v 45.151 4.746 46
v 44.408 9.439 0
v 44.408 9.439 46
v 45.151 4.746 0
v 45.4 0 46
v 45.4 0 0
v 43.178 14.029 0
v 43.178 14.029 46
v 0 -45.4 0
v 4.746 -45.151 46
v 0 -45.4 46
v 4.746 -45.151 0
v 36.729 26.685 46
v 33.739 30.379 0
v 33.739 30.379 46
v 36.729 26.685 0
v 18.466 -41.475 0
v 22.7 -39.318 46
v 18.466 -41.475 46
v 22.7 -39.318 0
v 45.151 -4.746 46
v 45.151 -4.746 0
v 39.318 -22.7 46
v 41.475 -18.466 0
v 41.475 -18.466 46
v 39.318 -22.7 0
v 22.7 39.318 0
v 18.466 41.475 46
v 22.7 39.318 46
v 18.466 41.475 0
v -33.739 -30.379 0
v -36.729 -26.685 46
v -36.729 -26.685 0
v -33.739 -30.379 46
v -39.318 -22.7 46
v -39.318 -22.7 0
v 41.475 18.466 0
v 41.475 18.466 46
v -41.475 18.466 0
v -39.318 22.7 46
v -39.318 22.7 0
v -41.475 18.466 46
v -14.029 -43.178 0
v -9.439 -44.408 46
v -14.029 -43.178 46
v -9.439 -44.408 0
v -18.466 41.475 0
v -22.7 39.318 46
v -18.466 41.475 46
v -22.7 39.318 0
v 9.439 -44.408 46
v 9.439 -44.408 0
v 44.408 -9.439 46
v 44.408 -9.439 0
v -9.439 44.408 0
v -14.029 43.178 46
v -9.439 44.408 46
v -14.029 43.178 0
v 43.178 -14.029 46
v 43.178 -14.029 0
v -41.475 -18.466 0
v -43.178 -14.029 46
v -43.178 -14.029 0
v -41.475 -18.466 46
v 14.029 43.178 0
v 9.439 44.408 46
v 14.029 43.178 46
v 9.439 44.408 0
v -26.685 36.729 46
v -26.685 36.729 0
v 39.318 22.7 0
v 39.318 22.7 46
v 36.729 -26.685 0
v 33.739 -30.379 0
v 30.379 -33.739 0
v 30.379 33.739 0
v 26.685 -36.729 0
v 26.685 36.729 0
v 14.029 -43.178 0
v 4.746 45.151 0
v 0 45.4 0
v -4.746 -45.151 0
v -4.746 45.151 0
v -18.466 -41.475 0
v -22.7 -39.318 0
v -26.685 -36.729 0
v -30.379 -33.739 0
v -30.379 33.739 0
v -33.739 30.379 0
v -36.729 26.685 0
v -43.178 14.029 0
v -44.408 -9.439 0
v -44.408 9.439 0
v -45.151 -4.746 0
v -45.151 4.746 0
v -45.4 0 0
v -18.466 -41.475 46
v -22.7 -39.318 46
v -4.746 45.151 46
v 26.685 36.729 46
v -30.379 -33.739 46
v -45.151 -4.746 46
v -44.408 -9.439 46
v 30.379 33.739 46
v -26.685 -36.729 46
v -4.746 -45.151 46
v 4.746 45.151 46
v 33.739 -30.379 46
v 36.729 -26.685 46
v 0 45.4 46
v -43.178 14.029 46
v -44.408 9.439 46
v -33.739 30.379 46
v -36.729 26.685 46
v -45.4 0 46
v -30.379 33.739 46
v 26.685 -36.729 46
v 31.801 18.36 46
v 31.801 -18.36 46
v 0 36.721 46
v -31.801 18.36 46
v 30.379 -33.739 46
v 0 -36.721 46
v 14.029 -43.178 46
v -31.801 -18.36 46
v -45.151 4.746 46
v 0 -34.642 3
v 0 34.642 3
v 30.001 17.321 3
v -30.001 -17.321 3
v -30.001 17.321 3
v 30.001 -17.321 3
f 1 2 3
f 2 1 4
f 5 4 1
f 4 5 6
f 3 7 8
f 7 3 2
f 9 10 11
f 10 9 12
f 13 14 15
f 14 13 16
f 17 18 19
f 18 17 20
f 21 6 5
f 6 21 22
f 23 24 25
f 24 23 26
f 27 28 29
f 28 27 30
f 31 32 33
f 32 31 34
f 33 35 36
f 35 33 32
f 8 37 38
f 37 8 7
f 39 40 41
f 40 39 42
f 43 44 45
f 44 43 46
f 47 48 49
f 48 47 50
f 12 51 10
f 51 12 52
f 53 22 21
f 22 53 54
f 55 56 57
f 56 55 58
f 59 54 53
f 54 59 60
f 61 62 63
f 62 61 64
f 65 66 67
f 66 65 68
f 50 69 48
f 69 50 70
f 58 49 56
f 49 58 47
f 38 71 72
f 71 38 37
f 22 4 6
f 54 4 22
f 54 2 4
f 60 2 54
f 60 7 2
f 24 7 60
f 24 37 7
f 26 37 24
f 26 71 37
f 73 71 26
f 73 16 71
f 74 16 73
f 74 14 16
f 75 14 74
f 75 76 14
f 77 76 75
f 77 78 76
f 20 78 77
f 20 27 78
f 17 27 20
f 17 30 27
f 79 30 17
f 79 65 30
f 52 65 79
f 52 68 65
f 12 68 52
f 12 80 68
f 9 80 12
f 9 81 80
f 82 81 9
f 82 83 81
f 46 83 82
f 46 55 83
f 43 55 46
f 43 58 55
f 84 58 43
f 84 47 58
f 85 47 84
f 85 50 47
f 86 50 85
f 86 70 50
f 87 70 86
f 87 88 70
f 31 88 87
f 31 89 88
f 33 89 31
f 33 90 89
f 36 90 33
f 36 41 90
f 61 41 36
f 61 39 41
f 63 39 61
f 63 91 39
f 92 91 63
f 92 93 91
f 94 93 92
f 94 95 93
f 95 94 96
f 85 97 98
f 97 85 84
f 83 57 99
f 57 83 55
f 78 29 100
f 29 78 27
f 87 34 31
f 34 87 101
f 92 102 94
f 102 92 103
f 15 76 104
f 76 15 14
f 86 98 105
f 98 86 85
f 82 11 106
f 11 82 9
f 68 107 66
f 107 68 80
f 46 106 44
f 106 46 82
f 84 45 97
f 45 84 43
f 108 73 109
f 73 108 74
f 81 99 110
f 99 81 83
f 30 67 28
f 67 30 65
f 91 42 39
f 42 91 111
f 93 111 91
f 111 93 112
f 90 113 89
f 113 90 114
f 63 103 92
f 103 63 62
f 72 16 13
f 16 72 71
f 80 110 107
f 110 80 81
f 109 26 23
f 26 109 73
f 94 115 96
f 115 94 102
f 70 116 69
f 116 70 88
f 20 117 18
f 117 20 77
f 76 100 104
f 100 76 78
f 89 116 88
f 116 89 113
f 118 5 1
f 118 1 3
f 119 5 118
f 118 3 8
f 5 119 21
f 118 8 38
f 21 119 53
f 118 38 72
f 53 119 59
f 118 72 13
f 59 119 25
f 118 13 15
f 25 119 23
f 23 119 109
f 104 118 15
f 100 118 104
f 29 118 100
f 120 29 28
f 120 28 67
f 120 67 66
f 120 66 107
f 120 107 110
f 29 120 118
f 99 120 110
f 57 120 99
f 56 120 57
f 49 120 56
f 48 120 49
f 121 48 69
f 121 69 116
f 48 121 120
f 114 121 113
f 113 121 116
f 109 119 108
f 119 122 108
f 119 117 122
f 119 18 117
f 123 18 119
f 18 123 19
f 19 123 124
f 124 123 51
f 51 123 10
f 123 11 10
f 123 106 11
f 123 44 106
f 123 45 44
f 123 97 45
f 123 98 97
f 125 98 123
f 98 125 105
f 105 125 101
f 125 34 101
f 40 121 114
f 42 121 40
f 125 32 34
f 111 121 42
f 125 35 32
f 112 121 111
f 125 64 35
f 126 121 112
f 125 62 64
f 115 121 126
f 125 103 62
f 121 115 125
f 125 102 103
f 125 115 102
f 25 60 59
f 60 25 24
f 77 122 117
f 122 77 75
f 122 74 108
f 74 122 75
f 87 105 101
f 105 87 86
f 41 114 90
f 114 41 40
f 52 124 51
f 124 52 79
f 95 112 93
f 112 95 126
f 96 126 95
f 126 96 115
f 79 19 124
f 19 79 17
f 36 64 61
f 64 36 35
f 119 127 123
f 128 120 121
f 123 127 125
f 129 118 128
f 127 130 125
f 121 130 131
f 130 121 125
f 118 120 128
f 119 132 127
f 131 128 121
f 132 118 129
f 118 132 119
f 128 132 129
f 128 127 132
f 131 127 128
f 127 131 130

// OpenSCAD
// LEK-Såpe™️ Sekskant Form - ENKEL (CLEAN)
// Beregnet for 135g flytende masse -> 120g ferdig tørket såpe.
// Ingen kant, ingen tekst - bare ren form.

// --- INNSTILLINGER ---

soap_width = 60; // 6.0 cm

// Høydeberegning:
// Areal av sekskant = 0.866 * bredde^2.
// Areal = 0.866 * 6^2 = 31.2 cm2.
// Høyde = 135 cm3 / 31.2 cm2 = 4.3 cm.
soap_height = 43; 

wall_thickness = 3;
base_thickness = 3;
draft_angle = 1.06; // Slippvinkel

$fn = 60;

module soap_cavity() {
    rotate([0,0,30]) // Roterer slik at spissen er opp/ned eller flat side opp/ned
    linear_extrude(height = soap_height, scale = draft_angle) {
        circle(d = soap_width / 0.866, $fn=6); // Matematikk for å få riktig bredde på sekskant
    }
}

module mold() {
    difference() {
        // Ytre skall (sylinder som dekker sekskanten)
        translate([0, 0, 0])
        cylinder(
            h = soap_height + base_thickness, 
            r = (soap_width/1.5) * draft_angle + wall_thickness
        );

        // Hulrommet
        translate([0, 0, base_thickness])
        soap_cavity();
    }
}

mold();
